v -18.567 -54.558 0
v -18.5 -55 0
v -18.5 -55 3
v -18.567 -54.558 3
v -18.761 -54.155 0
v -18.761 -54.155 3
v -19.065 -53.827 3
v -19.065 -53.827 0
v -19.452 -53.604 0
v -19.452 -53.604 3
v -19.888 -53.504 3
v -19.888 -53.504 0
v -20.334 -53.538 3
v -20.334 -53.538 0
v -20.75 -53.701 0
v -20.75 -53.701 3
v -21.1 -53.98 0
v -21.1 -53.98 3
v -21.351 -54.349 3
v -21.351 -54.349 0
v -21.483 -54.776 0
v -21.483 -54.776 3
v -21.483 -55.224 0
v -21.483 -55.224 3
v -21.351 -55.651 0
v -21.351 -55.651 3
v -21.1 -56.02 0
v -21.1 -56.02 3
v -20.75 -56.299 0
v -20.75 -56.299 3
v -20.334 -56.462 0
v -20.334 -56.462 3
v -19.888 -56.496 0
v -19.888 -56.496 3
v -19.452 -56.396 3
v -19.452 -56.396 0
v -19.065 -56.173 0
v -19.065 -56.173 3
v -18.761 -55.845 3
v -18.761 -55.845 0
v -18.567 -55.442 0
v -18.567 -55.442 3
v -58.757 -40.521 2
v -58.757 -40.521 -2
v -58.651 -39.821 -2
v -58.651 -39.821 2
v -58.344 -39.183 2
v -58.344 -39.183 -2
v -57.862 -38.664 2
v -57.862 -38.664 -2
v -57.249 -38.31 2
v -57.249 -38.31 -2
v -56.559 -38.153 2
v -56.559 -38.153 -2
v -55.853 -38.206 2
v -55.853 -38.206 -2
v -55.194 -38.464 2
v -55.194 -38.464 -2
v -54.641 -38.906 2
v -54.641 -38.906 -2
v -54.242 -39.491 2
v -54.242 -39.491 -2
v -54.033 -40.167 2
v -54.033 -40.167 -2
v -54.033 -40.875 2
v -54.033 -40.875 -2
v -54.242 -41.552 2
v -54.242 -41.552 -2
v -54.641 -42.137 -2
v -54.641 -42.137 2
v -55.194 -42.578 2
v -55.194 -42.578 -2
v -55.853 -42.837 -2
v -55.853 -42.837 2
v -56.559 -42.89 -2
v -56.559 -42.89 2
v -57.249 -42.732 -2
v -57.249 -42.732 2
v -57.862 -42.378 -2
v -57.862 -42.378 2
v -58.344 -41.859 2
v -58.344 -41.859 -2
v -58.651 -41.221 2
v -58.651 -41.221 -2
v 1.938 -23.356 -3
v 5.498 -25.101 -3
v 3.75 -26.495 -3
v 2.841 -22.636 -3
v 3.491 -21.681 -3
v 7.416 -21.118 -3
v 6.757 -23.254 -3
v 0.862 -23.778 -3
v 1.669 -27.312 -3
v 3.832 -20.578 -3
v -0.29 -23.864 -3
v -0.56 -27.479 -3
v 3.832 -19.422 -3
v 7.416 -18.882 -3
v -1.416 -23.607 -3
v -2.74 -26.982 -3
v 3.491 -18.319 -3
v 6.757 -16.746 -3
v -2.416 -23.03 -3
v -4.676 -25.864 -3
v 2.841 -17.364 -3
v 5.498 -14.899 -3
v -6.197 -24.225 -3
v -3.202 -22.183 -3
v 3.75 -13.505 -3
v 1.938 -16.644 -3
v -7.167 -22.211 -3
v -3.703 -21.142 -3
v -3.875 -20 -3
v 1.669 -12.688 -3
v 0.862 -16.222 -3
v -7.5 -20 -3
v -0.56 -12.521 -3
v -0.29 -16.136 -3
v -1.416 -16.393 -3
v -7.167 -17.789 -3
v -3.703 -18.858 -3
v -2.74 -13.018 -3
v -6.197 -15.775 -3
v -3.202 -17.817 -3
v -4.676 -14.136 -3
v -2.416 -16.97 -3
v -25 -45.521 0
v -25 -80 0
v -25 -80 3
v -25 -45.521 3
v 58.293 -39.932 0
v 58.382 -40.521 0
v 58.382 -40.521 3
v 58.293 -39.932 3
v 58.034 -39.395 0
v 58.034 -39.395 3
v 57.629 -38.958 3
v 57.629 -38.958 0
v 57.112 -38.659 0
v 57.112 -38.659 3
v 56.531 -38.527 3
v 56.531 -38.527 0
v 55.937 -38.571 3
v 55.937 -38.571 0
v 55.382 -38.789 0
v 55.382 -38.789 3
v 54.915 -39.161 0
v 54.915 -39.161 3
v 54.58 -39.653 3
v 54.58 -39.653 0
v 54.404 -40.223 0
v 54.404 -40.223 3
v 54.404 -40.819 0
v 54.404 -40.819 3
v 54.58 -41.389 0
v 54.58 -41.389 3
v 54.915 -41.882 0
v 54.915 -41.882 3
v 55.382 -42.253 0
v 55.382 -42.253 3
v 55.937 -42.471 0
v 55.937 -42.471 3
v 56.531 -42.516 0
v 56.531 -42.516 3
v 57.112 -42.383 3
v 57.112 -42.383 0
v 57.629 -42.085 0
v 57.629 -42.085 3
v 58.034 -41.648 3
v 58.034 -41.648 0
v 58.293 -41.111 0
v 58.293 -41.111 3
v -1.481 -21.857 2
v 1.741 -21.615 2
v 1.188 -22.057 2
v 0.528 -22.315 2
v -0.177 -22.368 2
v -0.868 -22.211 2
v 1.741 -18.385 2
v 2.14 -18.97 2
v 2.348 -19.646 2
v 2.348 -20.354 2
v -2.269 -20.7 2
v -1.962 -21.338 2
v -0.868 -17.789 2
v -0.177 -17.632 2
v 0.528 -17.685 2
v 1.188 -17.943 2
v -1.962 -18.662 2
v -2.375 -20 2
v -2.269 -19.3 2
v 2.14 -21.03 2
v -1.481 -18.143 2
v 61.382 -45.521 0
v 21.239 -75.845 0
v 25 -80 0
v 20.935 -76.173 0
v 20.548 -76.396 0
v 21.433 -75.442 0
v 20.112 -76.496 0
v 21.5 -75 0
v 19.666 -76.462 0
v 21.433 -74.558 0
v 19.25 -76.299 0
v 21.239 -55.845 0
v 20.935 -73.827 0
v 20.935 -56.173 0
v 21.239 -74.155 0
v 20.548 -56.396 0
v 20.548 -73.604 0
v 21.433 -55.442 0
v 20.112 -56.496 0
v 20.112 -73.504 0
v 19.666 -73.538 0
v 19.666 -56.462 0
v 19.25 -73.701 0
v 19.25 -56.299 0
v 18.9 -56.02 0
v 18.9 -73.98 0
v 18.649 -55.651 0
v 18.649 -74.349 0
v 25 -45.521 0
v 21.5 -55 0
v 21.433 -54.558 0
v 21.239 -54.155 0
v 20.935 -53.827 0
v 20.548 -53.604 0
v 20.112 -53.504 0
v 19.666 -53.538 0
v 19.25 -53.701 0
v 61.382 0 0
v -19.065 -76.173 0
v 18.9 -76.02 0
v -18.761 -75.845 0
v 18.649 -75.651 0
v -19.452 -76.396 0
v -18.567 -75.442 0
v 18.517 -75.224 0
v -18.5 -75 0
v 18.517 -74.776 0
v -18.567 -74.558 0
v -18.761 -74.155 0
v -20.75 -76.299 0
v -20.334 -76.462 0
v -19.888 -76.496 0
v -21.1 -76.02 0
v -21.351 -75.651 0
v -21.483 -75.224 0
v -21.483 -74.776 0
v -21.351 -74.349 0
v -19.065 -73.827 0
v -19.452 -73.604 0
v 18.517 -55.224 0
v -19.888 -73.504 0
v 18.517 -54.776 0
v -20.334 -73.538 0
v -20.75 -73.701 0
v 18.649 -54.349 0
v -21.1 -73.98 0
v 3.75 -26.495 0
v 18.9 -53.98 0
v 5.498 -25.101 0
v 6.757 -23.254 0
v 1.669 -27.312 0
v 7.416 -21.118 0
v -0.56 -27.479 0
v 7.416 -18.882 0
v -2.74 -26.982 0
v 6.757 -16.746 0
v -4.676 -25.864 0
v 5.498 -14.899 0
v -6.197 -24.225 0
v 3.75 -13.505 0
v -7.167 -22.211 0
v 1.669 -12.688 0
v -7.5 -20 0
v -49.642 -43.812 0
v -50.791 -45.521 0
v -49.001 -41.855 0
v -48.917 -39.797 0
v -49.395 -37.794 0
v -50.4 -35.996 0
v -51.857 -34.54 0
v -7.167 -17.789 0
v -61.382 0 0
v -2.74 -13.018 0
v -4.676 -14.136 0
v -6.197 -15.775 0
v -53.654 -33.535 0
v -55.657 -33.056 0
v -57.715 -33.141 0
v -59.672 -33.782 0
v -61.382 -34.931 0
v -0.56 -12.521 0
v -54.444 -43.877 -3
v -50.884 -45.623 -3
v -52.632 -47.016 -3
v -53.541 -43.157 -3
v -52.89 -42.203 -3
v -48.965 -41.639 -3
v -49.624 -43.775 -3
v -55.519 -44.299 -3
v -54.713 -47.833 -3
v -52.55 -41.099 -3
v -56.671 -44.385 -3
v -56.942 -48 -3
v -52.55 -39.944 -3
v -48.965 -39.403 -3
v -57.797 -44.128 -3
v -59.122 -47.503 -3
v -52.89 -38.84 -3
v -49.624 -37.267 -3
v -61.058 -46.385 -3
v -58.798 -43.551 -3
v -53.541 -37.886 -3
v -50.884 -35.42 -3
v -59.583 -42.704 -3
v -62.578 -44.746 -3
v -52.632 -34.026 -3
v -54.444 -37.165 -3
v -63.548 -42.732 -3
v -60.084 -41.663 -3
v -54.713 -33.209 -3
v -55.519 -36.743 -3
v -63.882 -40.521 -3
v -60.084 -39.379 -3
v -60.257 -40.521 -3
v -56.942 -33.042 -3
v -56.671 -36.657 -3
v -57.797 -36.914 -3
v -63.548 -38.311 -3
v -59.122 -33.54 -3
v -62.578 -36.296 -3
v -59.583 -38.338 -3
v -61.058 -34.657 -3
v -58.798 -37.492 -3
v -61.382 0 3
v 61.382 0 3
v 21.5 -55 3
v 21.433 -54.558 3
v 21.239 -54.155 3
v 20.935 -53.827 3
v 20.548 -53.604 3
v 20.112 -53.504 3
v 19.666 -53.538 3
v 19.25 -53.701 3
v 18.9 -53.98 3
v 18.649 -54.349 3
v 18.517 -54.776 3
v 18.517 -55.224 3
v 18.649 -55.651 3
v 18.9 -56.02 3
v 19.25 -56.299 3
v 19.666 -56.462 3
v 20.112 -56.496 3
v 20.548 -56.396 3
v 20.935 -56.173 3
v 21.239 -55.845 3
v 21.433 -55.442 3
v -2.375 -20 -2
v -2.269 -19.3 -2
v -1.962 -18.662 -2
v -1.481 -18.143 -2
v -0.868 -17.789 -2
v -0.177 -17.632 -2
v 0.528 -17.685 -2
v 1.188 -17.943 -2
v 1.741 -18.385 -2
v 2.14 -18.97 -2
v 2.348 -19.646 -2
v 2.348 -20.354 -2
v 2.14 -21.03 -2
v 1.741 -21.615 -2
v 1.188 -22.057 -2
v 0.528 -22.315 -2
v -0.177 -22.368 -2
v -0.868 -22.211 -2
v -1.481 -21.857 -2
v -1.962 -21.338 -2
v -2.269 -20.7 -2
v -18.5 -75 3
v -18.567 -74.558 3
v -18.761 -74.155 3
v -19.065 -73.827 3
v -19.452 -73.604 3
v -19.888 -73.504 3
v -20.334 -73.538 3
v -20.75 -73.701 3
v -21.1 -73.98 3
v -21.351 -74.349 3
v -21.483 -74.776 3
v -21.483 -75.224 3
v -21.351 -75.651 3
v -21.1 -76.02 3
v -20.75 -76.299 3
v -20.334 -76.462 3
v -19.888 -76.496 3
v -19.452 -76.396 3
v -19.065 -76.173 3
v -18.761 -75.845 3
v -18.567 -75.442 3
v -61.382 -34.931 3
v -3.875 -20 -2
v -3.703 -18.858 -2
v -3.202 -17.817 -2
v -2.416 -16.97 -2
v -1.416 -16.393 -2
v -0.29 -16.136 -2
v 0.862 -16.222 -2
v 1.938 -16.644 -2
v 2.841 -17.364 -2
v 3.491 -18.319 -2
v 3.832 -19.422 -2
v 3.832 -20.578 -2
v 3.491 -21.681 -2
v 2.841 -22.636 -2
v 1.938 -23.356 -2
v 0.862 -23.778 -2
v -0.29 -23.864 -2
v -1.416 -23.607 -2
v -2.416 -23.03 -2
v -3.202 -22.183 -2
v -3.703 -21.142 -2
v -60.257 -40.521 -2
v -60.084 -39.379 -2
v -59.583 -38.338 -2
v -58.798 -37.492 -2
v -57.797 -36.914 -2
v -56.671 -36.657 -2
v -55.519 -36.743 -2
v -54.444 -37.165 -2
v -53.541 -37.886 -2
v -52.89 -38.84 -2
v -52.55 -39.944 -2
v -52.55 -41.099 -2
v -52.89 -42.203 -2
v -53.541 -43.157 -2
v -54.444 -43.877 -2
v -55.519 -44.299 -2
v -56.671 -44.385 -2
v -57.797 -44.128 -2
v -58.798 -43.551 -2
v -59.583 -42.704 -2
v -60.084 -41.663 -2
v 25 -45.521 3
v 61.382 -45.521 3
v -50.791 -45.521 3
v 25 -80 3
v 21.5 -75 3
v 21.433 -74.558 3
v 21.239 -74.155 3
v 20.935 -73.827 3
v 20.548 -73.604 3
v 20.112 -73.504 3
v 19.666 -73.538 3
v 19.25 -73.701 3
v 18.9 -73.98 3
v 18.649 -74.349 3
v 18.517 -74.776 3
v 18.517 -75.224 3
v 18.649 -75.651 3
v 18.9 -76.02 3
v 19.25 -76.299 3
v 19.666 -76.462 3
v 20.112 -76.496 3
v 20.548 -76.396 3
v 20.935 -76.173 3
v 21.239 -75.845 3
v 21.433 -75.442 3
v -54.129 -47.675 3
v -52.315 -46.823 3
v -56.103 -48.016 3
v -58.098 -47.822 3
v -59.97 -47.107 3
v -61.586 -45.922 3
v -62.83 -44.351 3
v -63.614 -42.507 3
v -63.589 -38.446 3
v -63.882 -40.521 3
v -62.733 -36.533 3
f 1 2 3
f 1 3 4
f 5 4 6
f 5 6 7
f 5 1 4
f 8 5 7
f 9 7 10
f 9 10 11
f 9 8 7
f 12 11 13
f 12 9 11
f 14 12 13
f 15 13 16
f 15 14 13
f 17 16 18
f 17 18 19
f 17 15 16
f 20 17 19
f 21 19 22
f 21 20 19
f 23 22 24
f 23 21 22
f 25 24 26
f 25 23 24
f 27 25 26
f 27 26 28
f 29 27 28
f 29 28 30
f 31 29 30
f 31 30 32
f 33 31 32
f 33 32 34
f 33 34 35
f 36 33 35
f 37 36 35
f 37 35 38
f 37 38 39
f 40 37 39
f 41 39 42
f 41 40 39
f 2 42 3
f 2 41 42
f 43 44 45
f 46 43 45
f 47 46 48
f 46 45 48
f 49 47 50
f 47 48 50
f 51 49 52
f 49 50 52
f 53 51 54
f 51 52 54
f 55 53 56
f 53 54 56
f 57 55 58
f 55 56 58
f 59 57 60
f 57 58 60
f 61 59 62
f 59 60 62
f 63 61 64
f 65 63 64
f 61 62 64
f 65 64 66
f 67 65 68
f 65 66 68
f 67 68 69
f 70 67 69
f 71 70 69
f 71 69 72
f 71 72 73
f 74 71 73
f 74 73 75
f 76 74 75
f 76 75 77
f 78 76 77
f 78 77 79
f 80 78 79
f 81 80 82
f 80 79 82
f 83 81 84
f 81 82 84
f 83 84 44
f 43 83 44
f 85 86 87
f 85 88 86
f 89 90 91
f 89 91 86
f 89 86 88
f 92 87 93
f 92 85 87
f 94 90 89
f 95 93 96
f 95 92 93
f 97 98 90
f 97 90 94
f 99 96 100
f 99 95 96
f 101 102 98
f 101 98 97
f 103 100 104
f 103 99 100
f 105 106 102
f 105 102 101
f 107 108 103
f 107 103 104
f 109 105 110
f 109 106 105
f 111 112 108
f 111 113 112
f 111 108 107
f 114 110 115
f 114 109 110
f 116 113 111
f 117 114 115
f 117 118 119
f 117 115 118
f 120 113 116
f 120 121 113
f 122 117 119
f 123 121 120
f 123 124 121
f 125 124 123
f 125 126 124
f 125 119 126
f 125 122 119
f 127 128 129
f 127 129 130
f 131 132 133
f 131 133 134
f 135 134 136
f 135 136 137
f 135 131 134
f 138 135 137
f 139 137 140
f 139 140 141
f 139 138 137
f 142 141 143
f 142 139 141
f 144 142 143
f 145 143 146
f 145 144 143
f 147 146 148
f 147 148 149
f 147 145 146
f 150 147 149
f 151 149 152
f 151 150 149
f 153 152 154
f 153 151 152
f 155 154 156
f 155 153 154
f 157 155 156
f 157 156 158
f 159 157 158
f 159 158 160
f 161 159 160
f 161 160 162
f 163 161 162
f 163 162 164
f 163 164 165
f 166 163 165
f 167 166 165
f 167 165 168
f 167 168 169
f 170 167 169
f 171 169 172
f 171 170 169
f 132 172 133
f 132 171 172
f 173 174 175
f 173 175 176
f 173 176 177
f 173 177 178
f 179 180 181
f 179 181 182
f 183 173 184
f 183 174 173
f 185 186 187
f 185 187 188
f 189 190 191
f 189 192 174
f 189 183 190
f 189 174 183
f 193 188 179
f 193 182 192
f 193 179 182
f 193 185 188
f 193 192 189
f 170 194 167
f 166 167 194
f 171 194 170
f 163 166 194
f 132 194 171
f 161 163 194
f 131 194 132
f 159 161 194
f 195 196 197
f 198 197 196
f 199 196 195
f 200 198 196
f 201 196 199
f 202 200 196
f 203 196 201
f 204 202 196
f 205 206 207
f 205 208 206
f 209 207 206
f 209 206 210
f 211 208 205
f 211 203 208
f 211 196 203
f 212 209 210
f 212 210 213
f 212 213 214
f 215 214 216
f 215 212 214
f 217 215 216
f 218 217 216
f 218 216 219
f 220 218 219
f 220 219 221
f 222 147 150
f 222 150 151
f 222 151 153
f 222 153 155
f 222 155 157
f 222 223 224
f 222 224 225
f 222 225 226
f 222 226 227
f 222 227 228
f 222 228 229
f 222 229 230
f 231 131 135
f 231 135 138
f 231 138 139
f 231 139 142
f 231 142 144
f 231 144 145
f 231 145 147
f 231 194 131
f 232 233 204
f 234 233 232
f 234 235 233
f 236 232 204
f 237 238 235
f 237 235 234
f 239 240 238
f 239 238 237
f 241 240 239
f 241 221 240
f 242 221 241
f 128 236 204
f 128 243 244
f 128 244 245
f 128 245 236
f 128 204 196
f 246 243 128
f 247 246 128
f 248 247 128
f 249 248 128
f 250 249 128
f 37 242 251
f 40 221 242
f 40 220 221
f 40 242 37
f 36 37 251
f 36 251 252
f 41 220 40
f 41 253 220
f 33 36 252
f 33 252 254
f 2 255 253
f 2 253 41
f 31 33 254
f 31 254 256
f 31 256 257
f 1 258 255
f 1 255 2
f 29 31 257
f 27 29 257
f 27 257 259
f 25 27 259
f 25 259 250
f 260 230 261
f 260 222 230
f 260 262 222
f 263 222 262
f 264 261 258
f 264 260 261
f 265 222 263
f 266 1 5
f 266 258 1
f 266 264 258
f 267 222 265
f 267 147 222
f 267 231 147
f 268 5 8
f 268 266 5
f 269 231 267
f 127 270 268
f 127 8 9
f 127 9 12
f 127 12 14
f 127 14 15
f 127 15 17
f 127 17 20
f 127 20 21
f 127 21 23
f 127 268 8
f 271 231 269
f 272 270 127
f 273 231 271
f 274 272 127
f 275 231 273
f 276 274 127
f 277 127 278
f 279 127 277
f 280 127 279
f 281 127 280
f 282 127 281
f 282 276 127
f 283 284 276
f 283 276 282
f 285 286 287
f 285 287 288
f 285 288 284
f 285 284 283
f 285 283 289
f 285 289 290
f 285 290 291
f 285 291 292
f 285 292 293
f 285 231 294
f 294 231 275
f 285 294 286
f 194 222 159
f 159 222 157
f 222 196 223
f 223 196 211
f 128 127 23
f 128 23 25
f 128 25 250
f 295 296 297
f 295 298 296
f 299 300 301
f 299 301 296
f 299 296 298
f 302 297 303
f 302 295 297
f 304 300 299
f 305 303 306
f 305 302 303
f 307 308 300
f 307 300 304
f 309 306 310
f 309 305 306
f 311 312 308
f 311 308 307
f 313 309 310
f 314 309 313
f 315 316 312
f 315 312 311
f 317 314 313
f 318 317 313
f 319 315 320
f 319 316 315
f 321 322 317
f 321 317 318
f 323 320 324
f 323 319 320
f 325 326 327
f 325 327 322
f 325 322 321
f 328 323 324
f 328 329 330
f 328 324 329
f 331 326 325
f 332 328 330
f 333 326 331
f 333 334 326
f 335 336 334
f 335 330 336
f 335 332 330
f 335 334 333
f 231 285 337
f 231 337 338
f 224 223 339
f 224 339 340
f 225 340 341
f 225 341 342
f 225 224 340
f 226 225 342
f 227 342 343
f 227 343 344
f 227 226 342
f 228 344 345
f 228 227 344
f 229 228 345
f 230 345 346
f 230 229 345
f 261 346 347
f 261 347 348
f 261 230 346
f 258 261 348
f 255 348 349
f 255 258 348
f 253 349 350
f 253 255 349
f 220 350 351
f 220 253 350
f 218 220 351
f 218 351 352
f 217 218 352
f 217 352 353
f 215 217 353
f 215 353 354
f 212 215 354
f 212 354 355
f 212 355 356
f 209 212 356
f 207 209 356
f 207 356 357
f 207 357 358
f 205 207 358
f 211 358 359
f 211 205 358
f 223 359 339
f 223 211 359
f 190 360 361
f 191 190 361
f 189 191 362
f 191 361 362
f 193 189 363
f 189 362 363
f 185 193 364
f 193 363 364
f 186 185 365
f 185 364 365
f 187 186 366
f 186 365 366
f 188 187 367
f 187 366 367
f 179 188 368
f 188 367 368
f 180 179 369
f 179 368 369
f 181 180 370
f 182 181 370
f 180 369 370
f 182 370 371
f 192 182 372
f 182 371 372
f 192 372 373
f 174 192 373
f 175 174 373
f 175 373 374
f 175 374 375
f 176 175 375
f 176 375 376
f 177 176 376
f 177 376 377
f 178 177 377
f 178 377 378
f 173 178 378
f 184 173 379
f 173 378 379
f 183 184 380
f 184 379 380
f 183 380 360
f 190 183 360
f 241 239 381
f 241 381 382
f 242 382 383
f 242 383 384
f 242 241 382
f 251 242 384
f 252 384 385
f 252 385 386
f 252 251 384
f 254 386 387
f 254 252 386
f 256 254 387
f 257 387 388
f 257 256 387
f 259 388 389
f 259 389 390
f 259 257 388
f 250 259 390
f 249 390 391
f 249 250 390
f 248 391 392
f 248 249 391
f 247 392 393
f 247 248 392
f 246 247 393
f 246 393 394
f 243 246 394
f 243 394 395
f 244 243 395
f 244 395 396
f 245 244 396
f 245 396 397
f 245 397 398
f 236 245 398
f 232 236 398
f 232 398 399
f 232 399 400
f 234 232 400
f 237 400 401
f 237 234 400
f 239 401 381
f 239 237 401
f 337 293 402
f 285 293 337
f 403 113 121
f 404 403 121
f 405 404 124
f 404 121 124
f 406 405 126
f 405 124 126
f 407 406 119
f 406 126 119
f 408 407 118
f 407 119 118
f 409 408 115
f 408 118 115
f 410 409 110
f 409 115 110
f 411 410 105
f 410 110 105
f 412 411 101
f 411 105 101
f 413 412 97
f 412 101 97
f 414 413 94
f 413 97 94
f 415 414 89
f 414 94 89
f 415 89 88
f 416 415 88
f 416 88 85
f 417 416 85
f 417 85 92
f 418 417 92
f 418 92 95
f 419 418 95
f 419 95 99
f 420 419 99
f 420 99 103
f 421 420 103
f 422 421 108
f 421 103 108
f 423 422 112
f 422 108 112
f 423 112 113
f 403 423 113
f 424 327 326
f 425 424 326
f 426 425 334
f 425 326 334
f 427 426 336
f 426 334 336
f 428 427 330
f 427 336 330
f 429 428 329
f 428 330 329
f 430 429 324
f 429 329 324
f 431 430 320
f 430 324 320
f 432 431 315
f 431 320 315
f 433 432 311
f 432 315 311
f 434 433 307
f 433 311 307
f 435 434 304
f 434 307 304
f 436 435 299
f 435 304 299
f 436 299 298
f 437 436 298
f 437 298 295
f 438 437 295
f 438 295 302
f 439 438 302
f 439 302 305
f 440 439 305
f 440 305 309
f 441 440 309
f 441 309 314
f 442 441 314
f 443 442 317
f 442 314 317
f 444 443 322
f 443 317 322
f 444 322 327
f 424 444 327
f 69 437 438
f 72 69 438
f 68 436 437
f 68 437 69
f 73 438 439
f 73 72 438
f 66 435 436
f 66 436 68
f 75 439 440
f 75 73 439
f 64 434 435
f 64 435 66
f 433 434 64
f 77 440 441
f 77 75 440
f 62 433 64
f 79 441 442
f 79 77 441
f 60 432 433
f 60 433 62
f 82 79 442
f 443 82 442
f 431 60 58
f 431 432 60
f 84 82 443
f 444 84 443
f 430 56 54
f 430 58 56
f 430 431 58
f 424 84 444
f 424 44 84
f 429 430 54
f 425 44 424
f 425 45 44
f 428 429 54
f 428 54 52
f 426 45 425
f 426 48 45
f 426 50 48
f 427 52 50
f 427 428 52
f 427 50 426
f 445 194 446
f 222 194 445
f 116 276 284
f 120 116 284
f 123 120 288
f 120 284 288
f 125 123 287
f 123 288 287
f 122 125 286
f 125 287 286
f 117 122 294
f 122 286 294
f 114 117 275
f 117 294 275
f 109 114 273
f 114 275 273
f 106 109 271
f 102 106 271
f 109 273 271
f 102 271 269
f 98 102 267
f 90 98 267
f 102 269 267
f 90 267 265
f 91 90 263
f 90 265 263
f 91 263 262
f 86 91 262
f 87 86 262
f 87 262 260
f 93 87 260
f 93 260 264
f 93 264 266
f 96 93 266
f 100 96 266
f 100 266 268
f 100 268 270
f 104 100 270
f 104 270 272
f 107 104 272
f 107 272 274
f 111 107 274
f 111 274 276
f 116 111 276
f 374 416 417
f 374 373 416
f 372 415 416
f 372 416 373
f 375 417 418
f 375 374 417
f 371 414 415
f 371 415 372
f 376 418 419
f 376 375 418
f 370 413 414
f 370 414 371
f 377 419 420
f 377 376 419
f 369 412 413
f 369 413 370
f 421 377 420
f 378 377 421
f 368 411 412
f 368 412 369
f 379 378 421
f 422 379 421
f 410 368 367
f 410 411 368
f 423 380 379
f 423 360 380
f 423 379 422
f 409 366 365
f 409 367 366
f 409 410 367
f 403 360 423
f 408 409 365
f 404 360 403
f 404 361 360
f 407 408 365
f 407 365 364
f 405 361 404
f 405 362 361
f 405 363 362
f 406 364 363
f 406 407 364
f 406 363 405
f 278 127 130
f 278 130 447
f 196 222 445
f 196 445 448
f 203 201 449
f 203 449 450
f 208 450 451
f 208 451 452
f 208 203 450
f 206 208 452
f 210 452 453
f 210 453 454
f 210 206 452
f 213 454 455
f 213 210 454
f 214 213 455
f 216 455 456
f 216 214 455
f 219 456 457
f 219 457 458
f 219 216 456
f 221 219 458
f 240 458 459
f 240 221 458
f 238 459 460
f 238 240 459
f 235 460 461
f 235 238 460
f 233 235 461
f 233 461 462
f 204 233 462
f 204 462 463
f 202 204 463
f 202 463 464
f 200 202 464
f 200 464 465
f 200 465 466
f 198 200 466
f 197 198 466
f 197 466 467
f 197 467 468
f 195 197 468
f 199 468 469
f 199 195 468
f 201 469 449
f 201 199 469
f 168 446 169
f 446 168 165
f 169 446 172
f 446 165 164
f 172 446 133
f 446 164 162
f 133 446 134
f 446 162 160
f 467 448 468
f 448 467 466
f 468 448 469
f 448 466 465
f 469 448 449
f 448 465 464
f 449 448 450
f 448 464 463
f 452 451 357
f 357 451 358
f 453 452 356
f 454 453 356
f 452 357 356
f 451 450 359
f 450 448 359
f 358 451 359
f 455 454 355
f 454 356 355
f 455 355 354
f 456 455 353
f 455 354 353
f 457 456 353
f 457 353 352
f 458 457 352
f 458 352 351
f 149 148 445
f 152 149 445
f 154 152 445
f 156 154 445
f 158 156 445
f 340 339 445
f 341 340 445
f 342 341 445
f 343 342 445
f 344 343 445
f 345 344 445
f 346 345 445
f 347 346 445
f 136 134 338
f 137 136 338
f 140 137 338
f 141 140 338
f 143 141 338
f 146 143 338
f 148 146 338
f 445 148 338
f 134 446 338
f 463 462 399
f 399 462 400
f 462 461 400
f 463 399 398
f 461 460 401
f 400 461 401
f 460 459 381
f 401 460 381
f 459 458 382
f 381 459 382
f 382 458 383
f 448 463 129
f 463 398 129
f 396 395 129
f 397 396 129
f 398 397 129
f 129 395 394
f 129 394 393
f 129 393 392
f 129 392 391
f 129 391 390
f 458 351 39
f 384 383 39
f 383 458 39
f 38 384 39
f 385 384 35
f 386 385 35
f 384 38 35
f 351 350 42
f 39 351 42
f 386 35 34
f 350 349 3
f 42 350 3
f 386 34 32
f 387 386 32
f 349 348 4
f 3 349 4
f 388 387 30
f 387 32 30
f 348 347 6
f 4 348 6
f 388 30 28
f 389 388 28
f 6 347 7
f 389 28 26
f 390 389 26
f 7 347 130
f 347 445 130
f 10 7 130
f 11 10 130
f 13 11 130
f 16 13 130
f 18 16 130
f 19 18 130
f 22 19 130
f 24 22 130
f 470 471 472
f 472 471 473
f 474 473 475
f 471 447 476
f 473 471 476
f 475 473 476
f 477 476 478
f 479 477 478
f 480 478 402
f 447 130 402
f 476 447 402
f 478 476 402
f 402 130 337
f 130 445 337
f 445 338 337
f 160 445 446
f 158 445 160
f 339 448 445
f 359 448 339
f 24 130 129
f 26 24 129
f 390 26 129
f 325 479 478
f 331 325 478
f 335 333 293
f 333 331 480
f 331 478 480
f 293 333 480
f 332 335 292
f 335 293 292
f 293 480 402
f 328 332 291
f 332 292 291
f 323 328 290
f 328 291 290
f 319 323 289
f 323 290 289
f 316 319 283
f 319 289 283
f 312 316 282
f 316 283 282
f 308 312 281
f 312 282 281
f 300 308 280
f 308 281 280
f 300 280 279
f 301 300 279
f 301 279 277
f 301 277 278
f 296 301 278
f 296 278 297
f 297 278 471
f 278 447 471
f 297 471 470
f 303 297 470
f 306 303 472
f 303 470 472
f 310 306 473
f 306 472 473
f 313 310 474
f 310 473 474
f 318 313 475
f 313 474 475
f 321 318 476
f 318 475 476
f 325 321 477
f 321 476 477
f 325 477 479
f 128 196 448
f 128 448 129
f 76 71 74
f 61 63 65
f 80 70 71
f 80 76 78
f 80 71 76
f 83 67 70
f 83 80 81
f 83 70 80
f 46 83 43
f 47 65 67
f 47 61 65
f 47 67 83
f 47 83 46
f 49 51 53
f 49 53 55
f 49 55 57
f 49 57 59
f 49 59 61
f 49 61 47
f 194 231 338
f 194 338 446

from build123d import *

# Parameters (mm, degrees)
ESQUISSE1_R             = 2
ESQUISSE1_R_2           = 1.5
BOSS_EXTRU_1_DEPTH      = 3
BOSS_EXTRU_2_START      = -3
ESQUISSE3_R             = 7.5
BOSS_EXTRU_2_DEPTH      = 6
ESQUISSE4_R             = 3.875
ENL_V_MAT_EXTRU_1_DEPTH = 1
ESQUISSE5_R             = 2.375
ENL_V_MAT_EXTRU_2_DEPTH = 4


with BuildPart() as part:
    # Esquisse1 → Boss.-Extru.1 (new body)
    with BuildSketch(Plane.XY):
        Polygon((-61.381557247, 0), (61.381557247, 0), (61.381557247, -45.5212086), (25, -45.5212086), (25, -80), (-25, -80), (-25, -45.5212086), (-61.381557247, -45.5212086), align=None)
        with Locations((0, -20)):
            Circle(ESQUISSE1_R, mode=Mode.SUBTRACT)
        with Locations((-20, -55)):
            Circle(ESQUISSE1_R_2, mode=Mode.SUBTRACT)
        with Locations((20, -55)):
            Circle(ESQUISSE1_R_2, mode=Mode.SUBTRACT)
        with Locations((20, -75)):
            Circle(ESQUISSE1_R_2, mode=Mode.SUBTRACT)
        with Locations((-20, -75)):
            Circle(ESQUISSE1_R_2, mode=Mode.SUBTRACT)
        with Locations((56.381557247, -40.5212086)):
            Circle(ESQUISSE1_R, mode=Mode.SUBTRACT)
        with Locations((-56.381557247, -40.5212086)):
            Circle(ESQUISSE1_R, mode=Mode.SUBTRACT)
    extrude(amount=BOSS_EXTRU_1_DEPTH)

    # Esquisse3 → Boss.-Extru.2 (add)
    with BuildSketch(Plane(origin=(0, 0, 0), x_dir=(-1, 0, 0), z_dir=(0, 0, -1)).offset(BOSS_EXTRU_2_START)):
        with Locations((56.381557247, -40.5212086)):
            Circle(ESQUISSE3_R)
        with Locations((0, -20)):
            Circle(ESQUISSE3_R)
    extrude(amount=BOSS_EXTRU_2_DEPTH)

    # Esquisse4 → Enlèv. mat.-Extru.1 (cut)
    with BuildSketch(Plane(origin=(0, 0, -3), x_dir=(-1, 0, 0), z_dir=(0, 0, -1))):
        with Locations((56.381557247, -40.5212086)):
            Circle(ESQUISSE4_R)
        with Locations((0, -20)):
            Circle(ESQUISSE4_R)
    extrude(amount=-ENL_V_MAT_EXTRU_1_DEPTH, mode=Mode.SUBTRACT)

    # Esquisse5 → Enlèv. mat.-Extru.2 (cut)
    with BuildSketch(Plane(origin=(0, 0, -2), x_dir=(-1, 0, 0), z_dir=(0, 0, -1))):
        with Locations((56.381557247, -40.5212086)):
            Circle(ESQUISSE5_R)
        with Locations((0, -20)):
            Circle(ESQUISSE5_R)
    extrude(amount=-ENL_V_MAT_EXTRU_2_DEPTH, mode=Mode.SUBTRACT)


solid = part.part
